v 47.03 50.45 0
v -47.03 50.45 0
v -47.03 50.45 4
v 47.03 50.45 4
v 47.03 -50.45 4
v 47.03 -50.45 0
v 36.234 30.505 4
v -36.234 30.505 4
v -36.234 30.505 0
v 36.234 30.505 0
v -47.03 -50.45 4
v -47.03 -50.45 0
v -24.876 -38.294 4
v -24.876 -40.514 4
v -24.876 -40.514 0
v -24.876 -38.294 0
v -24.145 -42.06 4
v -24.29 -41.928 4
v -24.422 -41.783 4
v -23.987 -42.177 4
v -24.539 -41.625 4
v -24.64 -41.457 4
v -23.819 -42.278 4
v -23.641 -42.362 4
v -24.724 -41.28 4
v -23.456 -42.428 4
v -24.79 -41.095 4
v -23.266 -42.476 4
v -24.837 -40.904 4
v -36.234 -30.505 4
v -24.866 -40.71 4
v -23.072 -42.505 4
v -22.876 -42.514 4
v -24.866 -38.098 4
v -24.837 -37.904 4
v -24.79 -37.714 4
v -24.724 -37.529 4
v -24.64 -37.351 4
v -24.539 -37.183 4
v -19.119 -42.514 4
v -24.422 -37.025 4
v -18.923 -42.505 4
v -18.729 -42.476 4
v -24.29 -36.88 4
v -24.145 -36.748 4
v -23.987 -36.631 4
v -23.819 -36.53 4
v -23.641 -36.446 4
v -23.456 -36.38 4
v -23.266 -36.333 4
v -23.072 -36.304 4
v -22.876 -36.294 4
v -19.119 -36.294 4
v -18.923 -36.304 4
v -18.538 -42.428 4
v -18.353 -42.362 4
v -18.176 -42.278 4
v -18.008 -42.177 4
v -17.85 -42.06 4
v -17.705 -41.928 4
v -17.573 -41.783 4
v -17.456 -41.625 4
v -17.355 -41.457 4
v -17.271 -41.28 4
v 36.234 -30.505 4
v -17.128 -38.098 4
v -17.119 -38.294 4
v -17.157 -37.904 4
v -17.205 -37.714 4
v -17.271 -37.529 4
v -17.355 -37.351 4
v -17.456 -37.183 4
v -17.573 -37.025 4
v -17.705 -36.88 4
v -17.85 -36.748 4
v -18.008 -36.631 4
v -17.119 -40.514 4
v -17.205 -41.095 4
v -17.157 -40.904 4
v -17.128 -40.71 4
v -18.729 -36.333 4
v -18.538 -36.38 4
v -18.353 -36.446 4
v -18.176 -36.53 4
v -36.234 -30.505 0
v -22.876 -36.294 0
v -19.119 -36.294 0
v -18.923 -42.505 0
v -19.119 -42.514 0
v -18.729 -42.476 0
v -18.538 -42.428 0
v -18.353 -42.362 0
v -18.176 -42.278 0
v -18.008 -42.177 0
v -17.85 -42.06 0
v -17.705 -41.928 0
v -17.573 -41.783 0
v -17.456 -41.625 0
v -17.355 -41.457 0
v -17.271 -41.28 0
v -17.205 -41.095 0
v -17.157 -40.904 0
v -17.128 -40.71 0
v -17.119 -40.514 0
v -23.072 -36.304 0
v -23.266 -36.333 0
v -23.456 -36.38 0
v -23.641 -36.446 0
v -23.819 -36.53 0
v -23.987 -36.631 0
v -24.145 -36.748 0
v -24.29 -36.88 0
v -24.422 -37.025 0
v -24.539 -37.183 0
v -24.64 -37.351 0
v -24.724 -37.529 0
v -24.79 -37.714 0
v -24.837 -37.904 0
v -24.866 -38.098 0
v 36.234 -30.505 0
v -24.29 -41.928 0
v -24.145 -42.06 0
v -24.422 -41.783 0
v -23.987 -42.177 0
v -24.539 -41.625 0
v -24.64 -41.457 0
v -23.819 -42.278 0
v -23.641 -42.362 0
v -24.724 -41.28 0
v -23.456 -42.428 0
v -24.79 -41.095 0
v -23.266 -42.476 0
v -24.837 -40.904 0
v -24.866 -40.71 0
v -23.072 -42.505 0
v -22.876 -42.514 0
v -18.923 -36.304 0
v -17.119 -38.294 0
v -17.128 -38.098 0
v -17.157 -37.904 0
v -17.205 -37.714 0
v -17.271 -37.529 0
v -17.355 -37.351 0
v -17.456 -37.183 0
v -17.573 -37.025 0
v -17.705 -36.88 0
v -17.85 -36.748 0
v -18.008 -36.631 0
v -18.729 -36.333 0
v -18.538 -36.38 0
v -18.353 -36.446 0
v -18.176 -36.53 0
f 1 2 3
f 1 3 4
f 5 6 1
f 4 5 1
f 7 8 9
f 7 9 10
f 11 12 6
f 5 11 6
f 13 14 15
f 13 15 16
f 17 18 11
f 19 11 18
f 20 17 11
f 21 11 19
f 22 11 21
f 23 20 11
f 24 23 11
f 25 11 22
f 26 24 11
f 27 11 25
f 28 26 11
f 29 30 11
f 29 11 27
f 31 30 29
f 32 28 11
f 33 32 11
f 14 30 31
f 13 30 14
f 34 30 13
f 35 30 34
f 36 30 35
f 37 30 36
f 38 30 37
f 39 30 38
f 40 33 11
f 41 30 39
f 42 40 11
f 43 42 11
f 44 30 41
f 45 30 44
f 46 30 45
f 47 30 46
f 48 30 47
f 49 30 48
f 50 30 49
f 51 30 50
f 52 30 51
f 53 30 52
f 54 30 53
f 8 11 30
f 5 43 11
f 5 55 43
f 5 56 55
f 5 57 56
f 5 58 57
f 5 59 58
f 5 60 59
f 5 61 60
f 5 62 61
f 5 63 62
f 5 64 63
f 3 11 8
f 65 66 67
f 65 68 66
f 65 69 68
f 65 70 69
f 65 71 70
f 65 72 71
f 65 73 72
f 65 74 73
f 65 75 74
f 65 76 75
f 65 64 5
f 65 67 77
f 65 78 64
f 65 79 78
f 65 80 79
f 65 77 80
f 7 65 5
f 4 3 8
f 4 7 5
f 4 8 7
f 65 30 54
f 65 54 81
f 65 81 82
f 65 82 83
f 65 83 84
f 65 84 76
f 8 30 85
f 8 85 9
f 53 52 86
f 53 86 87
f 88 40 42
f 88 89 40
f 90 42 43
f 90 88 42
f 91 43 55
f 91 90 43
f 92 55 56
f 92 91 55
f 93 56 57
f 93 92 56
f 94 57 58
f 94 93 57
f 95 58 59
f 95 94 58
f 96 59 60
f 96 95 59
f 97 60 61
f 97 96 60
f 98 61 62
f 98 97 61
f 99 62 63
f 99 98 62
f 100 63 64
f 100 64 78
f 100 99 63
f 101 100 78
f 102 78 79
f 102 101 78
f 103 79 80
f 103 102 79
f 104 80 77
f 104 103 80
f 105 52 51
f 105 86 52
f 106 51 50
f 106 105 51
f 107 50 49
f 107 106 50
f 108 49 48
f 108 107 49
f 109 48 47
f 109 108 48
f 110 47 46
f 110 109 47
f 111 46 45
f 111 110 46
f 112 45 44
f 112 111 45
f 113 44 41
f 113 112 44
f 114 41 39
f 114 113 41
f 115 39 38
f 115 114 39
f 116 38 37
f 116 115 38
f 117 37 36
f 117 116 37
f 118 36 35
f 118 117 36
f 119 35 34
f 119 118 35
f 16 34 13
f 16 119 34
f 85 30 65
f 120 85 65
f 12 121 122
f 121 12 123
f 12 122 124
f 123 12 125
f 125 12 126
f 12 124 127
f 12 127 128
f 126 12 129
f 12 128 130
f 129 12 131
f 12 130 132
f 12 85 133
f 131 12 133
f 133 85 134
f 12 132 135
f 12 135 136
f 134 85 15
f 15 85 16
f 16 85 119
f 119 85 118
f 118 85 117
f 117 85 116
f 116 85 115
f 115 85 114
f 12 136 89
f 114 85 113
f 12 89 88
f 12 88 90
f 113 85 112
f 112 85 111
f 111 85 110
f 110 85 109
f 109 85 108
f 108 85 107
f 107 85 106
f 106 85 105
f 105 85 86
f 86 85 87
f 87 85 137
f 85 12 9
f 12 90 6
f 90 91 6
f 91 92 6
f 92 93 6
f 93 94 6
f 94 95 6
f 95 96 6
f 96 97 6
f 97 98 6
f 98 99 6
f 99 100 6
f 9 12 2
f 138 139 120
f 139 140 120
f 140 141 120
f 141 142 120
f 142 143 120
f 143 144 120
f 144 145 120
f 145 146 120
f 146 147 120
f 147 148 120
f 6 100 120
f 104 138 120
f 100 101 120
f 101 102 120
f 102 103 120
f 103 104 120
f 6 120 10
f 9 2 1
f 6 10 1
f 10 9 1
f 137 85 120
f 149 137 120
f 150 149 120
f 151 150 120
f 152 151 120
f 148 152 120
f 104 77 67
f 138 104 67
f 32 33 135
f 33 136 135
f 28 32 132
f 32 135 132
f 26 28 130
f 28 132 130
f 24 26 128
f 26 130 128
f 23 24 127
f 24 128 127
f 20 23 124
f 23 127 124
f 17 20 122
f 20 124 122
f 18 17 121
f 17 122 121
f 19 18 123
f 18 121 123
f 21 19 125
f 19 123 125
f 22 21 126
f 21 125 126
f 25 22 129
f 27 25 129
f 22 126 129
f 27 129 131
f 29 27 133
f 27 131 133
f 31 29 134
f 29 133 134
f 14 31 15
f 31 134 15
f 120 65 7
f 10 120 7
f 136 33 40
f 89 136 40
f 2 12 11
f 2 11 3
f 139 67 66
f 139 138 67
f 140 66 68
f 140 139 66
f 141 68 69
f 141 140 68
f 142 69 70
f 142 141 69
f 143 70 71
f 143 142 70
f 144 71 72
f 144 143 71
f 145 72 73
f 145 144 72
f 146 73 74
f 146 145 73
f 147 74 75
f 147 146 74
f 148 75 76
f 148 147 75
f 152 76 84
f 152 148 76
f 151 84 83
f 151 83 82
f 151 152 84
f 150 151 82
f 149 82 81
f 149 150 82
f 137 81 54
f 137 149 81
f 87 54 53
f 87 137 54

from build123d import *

# Parameters (mm, degrees)
F0_W     = 94.059766
F0_H     = 100.90065
F1_DEPTH = 4
F6_W     = 72.467298
F6_H     = 61.010792
F2_DEPTH = 25
F3_W     = 7.757127
F3_H     = 6.220043
F4_DEPTH = 25
F5_R     = 2


with BuildPart() as f1:
    # F0 (on Top) → F1 (new body)
    with BuildSketch(Plane.XY):
        Rectangle(F0_W, F0_H)
    extrude(amount=F1_DEPTH)

    # F6 (on face) → F2 (cut)
    with BuildSketch(Plane.XY.offset(4)):
        Rectangle(F6_W, F6_H)
    extrude(amount=-F2_DEPTH, mode=Mode.SUBTRACT)

    # F3 (on face) → F4 (cut)
    with BuildSketch(Plane.XY.offset(4)):
        with Locations((-20.997285, -39.404213)):
            Rectangle(F3_W, F3_H)
    extrude(amount=-F4_DEPTH, mode=Mode.SUBTRACT)

    # F5
    f5_edges = [f1.edges().sort_by_distance(p)[0] for p in [
        (-24.875849, -36.294192, 2),
        (-24.875849, -42.514235, 2),
        (-17.118722, -42.514235, 2),
        (-17.118722, -36.294192, 2),
    ]]
    fillet(f5_edges, radius=F5_R)


solid = f1.part
